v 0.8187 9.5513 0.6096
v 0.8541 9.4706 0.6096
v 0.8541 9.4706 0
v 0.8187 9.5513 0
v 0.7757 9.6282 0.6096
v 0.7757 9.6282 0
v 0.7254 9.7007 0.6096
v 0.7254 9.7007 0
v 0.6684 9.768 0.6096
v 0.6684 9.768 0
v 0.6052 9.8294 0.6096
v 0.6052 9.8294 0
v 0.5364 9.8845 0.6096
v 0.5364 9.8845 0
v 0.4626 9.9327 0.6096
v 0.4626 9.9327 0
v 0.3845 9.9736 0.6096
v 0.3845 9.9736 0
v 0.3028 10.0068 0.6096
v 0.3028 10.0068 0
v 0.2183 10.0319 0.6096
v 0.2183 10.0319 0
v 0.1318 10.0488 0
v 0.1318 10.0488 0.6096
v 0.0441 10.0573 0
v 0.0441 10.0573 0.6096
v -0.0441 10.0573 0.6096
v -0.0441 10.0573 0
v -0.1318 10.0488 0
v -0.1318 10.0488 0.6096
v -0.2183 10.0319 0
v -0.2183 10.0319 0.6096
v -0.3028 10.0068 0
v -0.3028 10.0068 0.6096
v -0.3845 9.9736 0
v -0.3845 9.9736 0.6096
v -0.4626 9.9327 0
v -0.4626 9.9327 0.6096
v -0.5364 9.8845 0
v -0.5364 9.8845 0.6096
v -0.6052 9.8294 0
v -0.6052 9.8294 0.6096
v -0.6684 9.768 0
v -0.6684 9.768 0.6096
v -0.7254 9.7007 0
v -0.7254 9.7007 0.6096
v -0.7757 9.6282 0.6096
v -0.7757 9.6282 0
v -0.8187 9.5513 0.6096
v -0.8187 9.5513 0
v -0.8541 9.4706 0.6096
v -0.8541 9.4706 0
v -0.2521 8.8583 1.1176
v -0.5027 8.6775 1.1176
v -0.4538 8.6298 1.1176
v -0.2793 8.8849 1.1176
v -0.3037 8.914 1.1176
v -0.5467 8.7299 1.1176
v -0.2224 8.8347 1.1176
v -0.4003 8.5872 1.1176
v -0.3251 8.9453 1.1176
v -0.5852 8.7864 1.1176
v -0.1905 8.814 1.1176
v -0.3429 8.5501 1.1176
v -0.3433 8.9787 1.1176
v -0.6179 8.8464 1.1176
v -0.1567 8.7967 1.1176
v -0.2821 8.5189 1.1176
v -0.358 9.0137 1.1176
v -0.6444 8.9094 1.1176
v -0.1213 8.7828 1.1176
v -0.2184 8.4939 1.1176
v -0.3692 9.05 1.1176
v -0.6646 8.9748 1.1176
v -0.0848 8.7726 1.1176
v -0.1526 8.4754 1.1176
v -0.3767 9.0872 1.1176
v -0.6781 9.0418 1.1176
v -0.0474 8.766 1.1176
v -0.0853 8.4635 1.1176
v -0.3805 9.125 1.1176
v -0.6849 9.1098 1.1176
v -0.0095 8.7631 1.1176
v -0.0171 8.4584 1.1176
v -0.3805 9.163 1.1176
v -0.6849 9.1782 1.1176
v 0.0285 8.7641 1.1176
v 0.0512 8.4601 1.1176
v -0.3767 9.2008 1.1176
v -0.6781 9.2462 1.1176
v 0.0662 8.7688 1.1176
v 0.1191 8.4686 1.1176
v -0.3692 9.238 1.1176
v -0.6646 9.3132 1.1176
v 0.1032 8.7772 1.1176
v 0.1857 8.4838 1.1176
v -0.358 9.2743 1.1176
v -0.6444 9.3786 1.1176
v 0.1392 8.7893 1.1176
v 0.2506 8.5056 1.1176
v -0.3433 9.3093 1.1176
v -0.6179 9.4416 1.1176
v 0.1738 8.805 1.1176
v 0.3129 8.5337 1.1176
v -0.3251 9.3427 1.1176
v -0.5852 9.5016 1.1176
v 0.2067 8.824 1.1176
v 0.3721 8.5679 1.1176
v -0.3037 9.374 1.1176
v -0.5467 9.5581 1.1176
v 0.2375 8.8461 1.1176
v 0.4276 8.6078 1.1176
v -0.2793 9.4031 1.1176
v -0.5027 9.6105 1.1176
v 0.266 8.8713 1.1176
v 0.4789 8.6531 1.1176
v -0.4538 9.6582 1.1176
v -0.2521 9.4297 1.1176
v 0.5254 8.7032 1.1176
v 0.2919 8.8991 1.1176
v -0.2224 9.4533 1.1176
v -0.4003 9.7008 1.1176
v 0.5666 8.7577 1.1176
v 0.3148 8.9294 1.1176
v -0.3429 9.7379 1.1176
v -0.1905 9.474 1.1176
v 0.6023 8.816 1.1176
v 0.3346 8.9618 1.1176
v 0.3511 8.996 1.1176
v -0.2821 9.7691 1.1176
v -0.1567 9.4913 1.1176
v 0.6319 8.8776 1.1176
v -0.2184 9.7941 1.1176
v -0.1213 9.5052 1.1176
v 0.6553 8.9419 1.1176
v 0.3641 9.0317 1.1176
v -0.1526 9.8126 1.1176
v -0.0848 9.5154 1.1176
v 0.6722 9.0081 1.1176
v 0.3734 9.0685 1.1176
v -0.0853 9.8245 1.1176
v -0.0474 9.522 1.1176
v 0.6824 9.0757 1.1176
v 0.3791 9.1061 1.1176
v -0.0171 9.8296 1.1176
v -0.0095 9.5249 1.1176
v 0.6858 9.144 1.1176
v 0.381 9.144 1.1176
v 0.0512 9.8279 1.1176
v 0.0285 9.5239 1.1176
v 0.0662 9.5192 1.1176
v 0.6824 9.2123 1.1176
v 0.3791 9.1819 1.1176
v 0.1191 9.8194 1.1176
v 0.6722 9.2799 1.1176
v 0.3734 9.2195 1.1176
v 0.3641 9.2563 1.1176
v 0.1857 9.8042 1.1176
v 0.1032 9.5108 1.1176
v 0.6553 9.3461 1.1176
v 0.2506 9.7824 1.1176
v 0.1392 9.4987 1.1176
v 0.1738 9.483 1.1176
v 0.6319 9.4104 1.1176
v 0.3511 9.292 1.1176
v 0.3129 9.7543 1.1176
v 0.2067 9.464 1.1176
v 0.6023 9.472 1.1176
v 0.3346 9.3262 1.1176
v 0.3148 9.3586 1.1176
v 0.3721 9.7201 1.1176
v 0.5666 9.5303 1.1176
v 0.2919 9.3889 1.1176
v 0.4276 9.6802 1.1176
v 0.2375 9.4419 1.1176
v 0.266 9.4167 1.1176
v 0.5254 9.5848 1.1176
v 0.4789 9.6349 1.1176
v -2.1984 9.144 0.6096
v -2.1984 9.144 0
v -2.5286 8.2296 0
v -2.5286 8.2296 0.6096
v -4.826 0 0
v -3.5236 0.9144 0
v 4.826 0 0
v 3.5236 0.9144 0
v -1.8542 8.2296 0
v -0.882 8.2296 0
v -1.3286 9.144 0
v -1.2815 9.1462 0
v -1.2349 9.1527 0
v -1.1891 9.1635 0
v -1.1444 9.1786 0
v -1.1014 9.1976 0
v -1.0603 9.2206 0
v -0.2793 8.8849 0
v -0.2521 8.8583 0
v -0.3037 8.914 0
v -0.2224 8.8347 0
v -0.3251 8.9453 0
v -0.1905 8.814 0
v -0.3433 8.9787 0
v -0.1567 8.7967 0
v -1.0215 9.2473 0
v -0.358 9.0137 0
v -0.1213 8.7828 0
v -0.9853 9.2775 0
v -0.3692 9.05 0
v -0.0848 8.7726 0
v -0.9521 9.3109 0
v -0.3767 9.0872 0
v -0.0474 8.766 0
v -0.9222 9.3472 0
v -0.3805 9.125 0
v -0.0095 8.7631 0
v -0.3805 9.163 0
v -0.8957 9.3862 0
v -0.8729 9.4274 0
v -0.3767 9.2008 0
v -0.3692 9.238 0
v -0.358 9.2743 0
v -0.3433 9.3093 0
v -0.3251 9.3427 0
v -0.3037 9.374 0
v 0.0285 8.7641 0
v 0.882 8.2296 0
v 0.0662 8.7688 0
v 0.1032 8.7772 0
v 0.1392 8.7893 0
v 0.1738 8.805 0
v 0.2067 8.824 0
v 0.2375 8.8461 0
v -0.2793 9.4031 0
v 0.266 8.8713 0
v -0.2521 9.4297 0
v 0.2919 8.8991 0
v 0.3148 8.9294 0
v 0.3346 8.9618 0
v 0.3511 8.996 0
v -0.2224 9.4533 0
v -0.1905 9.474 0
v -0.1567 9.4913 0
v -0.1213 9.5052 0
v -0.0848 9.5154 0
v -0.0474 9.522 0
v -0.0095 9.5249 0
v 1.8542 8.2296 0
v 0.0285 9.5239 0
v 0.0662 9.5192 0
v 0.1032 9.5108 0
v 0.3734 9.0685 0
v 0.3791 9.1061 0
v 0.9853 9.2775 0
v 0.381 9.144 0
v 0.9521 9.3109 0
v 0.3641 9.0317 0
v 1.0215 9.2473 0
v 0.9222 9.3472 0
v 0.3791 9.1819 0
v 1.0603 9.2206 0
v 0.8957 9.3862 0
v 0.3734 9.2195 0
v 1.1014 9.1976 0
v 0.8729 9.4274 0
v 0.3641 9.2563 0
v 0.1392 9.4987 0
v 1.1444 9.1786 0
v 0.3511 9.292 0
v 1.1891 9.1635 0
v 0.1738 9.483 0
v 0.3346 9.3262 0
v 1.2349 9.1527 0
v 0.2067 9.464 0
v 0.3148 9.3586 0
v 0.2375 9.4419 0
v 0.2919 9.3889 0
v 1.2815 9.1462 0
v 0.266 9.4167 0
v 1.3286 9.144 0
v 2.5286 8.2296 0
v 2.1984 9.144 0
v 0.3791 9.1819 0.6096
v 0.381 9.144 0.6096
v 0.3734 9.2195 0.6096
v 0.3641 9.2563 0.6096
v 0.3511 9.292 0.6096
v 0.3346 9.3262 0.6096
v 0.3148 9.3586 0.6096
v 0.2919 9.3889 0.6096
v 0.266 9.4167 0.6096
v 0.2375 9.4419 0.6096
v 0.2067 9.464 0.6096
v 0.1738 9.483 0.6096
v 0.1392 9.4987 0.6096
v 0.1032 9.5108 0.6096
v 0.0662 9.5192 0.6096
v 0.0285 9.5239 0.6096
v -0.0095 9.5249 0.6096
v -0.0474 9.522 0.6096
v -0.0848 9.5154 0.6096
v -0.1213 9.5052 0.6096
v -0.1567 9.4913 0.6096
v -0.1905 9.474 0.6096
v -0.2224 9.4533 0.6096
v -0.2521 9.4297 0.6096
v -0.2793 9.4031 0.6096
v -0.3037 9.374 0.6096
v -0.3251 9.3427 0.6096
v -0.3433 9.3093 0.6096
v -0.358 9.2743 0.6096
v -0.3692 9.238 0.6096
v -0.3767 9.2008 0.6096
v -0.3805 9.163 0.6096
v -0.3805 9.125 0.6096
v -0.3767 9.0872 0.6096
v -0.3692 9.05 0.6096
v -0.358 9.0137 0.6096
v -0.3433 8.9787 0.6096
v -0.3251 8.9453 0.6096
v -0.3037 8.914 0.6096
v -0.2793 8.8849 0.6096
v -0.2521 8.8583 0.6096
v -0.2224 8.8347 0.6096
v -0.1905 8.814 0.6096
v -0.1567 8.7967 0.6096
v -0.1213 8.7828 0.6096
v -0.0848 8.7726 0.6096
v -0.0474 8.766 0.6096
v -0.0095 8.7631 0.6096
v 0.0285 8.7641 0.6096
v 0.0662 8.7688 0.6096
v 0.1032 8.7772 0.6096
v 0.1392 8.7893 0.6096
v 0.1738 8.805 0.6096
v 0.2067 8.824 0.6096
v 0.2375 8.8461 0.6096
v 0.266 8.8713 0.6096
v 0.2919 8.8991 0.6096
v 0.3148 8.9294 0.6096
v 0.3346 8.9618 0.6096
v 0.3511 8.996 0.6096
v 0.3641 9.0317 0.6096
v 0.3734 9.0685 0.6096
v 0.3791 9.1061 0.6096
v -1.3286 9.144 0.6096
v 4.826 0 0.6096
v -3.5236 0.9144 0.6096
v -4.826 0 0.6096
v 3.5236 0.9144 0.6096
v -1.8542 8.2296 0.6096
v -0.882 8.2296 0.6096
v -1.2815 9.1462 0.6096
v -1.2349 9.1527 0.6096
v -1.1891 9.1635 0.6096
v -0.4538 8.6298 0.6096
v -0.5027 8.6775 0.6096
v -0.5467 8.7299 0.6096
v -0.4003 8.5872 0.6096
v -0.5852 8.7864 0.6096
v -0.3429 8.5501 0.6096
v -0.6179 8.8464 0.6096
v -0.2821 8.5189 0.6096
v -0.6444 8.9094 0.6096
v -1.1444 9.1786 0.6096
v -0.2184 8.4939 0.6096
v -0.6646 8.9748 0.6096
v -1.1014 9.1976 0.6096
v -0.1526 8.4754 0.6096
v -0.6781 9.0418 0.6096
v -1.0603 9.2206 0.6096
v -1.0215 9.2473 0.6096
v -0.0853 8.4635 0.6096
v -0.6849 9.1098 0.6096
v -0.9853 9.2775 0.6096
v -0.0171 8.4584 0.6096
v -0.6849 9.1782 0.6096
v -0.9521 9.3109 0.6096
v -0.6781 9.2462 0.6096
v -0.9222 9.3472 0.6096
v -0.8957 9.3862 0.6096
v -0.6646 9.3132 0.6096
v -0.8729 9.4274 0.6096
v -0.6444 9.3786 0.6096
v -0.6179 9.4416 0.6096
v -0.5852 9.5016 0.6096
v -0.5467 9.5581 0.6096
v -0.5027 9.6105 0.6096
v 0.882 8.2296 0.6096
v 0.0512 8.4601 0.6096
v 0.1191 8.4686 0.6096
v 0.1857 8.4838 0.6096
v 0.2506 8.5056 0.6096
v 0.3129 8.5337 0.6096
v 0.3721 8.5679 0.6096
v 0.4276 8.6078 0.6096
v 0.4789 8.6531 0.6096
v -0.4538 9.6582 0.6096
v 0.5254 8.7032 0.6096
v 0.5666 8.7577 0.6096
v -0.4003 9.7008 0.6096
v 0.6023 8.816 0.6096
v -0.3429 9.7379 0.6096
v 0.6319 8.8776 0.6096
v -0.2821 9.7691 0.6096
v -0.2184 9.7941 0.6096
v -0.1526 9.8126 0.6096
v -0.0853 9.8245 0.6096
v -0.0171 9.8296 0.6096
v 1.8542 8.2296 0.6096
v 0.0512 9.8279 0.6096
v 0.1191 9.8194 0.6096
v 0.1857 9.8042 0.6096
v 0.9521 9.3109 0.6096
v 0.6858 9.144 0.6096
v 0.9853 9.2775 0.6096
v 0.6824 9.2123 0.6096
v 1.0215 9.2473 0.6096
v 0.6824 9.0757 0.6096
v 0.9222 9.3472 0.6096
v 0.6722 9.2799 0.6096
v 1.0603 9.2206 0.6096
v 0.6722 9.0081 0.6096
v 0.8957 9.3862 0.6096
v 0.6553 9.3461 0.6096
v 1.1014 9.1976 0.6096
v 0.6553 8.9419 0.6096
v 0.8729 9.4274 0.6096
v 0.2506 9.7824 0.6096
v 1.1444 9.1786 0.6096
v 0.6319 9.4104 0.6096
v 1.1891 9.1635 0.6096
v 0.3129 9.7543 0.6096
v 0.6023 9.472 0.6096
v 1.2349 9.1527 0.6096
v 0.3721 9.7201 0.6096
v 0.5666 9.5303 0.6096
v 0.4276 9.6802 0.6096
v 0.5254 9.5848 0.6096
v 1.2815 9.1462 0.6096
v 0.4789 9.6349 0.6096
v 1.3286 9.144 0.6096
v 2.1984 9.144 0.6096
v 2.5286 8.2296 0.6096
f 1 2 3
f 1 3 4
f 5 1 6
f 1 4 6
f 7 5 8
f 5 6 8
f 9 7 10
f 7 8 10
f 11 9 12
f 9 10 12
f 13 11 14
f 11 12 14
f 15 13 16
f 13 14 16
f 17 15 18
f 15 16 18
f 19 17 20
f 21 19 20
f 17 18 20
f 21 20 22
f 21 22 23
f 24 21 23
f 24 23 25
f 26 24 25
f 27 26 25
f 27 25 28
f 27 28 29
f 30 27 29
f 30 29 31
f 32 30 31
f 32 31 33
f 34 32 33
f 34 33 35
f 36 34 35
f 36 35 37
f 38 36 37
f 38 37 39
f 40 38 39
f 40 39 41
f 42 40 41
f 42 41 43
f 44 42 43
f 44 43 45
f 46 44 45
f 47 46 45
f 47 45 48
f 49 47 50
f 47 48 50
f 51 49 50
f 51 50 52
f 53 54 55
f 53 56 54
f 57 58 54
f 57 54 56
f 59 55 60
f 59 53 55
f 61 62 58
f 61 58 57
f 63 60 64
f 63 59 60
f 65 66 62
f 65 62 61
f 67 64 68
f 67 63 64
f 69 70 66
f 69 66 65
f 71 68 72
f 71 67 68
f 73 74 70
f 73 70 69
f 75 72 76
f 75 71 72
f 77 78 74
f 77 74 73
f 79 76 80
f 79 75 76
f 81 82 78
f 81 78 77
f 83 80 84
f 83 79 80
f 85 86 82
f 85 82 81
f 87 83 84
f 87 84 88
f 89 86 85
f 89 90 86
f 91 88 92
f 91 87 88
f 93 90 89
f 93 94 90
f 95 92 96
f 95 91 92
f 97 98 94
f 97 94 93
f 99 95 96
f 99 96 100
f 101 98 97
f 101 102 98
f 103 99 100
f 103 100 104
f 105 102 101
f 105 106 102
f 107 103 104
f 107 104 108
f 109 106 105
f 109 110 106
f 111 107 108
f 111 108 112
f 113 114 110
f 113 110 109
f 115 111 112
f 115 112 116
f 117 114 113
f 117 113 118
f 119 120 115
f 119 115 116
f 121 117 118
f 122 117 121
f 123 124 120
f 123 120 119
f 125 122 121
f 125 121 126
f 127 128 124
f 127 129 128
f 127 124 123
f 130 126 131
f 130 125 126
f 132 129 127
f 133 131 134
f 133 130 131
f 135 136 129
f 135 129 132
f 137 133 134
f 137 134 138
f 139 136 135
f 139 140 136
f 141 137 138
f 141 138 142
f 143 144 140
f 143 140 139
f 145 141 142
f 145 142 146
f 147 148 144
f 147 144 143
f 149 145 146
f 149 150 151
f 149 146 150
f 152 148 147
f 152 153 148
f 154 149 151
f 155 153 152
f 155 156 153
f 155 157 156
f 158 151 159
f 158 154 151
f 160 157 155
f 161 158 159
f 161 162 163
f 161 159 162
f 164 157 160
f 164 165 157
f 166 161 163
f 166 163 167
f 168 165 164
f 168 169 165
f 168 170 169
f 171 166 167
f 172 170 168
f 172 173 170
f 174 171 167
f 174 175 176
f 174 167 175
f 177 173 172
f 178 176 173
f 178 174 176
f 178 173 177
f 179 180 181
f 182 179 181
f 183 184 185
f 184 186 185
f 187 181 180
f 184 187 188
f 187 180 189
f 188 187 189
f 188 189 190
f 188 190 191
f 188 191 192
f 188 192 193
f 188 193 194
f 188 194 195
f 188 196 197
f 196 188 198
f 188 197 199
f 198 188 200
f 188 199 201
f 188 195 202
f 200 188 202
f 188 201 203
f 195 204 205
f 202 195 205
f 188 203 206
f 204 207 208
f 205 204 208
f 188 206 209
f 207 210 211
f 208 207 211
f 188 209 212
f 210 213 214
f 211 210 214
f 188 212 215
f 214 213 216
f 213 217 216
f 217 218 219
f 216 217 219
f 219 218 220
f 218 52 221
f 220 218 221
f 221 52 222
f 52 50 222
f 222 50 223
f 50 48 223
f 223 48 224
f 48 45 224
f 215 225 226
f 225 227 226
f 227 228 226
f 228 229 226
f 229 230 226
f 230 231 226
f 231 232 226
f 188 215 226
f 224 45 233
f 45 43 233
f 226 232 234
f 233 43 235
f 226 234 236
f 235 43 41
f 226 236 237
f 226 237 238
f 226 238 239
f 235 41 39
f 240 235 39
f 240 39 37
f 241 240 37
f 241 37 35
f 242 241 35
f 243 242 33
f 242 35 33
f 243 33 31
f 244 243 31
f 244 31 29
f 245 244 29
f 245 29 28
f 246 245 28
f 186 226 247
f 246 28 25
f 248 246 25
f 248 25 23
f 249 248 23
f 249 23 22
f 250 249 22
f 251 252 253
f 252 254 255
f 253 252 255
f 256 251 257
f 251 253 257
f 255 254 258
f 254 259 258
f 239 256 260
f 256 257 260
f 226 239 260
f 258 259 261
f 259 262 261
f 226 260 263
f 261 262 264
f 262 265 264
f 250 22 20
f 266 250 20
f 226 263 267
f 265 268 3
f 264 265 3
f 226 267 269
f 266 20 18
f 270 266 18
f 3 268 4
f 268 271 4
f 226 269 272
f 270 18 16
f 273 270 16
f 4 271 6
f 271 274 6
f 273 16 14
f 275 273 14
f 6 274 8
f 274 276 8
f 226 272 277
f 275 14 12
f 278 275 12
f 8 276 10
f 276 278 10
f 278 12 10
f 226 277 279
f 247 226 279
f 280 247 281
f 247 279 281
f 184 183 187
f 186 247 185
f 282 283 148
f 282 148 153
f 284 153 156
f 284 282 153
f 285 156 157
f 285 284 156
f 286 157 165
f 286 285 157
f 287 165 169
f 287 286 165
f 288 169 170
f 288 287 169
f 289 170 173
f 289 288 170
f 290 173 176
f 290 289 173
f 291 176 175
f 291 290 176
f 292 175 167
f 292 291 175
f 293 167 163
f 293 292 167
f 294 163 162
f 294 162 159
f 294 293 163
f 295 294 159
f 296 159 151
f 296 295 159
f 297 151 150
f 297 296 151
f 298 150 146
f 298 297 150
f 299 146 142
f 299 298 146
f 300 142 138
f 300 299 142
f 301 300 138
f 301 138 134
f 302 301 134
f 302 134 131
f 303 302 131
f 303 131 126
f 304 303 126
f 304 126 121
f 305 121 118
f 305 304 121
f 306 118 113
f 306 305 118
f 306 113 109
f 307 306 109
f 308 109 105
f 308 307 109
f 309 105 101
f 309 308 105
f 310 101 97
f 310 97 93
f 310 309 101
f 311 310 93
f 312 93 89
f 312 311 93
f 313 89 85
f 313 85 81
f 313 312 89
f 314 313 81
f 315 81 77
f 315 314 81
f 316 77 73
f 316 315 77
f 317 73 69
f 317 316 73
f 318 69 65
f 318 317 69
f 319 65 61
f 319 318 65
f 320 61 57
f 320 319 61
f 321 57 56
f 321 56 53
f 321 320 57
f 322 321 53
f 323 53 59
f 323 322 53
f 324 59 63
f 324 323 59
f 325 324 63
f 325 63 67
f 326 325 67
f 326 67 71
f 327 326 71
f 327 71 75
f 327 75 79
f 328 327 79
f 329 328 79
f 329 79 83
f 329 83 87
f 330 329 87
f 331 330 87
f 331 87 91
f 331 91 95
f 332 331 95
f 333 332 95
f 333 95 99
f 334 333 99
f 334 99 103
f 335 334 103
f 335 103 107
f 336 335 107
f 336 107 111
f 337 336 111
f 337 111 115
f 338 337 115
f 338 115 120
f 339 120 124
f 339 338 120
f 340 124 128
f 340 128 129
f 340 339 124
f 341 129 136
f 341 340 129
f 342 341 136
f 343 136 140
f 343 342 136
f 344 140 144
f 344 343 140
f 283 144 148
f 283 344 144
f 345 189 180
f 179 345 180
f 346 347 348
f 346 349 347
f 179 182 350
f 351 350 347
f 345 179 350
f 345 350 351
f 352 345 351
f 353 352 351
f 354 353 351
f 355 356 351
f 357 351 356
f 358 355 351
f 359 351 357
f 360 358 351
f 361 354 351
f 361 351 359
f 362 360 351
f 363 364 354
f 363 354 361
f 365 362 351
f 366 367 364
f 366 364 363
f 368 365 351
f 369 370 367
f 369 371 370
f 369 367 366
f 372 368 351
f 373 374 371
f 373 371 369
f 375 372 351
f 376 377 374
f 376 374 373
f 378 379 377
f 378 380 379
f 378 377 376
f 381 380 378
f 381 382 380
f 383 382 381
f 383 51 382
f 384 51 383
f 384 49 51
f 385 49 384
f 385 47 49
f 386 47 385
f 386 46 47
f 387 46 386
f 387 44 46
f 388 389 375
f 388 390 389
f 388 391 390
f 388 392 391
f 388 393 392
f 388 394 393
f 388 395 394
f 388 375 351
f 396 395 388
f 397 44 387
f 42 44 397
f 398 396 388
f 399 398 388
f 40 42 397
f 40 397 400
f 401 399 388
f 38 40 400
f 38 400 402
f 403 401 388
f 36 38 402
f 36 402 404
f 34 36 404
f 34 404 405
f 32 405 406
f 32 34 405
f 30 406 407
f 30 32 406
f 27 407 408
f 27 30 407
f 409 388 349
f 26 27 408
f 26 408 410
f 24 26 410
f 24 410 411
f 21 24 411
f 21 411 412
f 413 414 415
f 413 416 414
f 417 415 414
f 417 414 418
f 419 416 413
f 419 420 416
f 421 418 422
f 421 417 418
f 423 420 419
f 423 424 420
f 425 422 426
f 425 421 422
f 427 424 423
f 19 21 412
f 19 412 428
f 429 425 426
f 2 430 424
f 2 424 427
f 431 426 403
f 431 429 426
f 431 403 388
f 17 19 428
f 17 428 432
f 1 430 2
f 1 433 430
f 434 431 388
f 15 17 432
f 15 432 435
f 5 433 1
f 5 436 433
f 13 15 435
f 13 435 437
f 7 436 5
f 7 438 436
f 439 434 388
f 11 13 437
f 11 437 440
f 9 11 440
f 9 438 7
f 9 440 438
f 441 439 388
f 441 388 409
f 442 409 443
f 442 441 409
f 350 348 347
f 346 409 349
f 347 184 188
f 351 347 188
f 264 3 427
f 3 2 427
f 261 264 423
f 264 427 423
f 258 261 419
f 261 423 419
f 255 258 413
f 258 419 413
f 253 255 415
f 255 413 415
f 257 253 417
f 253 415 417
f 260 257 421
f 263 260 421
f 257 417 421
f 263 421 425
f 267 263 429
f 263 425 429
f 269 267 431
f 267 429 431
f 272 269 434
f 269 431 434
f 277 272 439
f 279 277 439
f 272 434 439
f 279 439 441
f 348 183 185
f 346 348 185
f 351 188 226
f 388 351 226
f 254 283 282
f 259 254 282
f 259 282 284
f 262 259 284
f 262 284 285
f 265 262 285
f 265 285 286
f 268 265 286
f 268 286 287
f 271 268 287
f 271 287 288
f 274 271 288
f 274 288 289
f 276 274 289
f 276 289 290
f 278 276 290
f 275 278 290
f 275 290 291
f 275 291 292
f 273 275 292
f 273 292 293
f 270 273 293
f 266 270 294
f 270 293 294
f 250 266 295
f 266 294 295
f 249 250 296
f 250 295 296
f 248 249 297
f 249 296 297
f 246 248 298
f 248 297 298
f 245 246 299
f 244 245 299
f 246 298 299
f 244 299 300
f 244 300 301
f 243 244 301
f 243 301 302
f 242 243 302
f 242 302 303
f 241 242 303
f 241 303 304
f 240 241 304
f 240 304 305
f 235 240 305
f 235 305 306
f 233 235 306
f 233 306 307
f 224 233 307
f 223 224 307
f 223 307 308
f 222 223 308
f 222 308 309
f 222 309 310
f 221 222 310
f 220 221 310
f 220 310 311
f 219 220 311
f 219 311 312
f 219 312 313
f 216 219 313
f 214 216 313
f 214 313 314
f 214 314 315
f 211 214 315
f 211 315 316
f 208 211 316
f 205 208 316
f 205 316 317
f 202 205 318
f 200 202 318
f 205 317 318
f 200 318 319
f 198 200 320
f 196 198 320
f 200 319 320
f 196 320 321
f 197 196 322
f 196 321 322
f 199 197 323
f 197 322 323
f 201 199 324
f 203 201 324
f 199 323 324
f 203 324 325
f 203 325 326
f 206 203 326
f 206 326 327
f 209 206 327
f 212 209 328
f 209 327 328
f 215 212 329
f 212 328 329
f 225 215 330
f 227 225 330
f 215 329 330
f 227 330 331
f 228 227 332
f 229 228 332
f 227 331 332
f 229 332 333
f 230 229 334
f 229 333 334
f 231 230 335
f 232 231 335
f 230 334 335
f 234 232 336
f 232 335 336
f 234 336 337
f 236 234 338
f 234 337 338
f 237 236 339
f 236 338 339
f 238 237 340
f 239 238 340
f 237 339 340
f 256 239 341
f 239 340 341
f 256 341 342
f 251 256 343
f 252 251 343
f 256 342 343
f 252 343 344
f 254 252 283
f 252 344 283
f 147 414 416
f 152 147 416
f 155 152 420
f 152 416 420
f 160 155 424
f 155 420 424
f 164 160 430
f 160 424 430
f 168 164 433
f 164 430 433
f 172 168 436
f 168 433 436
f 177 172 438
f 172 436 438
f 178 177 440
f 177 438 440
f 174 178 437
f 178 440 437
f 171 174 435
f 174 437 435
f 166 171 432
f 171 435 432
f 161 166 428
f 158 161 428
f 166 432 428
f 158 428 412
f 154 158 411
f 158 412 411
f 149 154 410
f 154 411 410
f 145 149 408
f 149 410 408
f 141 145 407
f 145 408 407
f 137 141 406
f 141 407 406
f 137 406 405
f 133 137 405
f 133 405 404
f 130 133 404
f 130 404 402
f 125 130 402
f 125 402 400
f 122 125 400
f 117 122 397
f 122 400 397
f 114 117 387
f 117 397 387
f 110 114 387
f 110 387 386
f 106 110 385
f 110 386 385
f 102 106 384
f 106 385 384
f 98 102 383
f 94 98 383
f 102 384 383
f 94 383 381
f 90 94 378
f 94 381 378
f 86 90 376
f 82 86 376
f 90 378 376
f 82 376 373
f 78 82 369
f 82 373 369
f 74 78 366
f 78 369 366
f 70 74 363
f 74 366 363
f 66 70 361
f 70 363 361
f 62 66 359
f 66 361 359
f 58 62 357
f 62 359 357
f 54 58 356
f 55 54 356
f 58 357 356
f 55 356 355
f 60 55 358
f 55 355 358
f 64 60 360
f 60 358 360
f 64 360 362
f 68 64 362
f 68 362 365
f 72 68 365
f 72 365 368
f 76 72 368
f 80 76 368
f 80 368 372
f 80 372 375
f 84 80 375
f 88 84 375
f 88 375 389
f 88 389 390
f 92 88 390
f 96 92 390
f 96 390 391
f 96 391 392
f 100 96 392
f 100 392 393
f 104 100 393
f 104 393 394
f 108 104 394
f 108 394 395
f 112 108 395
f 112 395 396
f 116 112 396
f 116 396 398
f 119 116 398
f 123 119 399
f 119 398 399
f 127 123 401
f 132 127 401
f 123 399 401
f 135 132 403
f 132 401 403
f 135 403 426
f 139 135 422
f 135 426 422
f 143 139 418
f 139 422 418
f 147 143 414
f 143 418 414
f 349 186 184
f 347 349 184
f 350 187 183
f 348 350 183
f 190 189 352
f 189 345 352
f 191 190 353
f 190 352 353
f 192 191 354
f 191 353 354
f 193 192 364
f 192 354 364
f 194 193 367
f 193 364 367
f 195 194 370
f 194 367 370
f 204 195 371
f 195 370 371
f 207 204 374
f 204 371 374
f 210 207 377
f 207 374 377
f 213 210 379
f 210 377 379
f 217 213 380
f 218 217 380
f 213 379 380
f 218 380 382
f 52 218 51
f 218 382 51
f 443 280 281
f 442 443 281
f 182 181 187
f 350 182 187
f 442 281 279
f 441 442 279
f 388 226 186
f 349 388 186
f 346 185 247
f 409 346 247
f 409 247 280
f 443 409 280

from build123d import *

# Parameters (mm, degrees)
F1_DEPTH = 0.6096
F2_R     = 0.381
F3_DEPTH = 25.4
F4_R     = 0.508
F5_R     = 0.6858
F5_R_2   = 0.381
F6_DEPTH = 0.508


with BuildPart() as f1:
    # F0 (on Top) → F1 (new body)
    with BuildSketch(Plane.XY):
        with BuildLine():
            Line((-1.8542, 8.2296), (-4.826, 0))
            Line((-4.826, 0), (0, 0))
            Line((0, 0), (4.826, 0))
            Line((4.826, 0), (1.8542, 8.2296))
            Line((1.8542, 8.2296), (2.528635, 8.2296))
            Line((2.528635, 8.2296), (2.198435, 9.144))
            Line((2.198435, 9.144), (1.524, 9.144))
            Line((1.524, 9.144), (0.9144, 9.144))
            ThreePointArc((0.9144, 9.144), (0, 10.0584), (-0.9144, 9.144))
            Line((-0.9144, 9.144), (-1.524, 9.144))
            Line((-1.524, 9.144), (-2.198435, 9.144))
            Line((-2.198435, 9.144), (-2.528635, 8.2296))
            Line((-2.528635, 8.2296), (-1.8542, 8.2296))
        make_face()
        Polygon((3.523607, 0.9144), (0, 0.9144), (-3.523607, 0.9144), (-0.882007, 8.2296), (0, 8.2296), (0.882007, 8.2296), align=None, mode=Mode.SUBTRACT)
    extrude(amount=F1_DEPTH)

    # F2 (on face) → F3 (cut)
    with BuildSketch(Plane.XY.offset(0.6096)):
        with Locations((0, 9.144)):
            Circle(F2_R)
    extrude(amount=-F3_DEPTH, mode=Mode.SUBTRACT)

    # F4
    f4_edges = [f1.edges().sort_by_distance(p)[0] for p in [
        (0.9144, 9.144, 0.3048),
        (-0.9144, 9.144, 0.3048),
    ]]
    fillet(f4_edges, radius=F4_R)

    # F5 (on face) → F6 (join)
    with BuildSketch(Plane.XY.offset(0.6096)):
        with Locations((0, 9.144)):
            Circle(F5_R)
        with Locations((0, 9.144)):
            Circle(F5_R_2, mode=Mode.SUBTRACT)
    extrude(amount=F6_DEPTH)


solid = f1.part
